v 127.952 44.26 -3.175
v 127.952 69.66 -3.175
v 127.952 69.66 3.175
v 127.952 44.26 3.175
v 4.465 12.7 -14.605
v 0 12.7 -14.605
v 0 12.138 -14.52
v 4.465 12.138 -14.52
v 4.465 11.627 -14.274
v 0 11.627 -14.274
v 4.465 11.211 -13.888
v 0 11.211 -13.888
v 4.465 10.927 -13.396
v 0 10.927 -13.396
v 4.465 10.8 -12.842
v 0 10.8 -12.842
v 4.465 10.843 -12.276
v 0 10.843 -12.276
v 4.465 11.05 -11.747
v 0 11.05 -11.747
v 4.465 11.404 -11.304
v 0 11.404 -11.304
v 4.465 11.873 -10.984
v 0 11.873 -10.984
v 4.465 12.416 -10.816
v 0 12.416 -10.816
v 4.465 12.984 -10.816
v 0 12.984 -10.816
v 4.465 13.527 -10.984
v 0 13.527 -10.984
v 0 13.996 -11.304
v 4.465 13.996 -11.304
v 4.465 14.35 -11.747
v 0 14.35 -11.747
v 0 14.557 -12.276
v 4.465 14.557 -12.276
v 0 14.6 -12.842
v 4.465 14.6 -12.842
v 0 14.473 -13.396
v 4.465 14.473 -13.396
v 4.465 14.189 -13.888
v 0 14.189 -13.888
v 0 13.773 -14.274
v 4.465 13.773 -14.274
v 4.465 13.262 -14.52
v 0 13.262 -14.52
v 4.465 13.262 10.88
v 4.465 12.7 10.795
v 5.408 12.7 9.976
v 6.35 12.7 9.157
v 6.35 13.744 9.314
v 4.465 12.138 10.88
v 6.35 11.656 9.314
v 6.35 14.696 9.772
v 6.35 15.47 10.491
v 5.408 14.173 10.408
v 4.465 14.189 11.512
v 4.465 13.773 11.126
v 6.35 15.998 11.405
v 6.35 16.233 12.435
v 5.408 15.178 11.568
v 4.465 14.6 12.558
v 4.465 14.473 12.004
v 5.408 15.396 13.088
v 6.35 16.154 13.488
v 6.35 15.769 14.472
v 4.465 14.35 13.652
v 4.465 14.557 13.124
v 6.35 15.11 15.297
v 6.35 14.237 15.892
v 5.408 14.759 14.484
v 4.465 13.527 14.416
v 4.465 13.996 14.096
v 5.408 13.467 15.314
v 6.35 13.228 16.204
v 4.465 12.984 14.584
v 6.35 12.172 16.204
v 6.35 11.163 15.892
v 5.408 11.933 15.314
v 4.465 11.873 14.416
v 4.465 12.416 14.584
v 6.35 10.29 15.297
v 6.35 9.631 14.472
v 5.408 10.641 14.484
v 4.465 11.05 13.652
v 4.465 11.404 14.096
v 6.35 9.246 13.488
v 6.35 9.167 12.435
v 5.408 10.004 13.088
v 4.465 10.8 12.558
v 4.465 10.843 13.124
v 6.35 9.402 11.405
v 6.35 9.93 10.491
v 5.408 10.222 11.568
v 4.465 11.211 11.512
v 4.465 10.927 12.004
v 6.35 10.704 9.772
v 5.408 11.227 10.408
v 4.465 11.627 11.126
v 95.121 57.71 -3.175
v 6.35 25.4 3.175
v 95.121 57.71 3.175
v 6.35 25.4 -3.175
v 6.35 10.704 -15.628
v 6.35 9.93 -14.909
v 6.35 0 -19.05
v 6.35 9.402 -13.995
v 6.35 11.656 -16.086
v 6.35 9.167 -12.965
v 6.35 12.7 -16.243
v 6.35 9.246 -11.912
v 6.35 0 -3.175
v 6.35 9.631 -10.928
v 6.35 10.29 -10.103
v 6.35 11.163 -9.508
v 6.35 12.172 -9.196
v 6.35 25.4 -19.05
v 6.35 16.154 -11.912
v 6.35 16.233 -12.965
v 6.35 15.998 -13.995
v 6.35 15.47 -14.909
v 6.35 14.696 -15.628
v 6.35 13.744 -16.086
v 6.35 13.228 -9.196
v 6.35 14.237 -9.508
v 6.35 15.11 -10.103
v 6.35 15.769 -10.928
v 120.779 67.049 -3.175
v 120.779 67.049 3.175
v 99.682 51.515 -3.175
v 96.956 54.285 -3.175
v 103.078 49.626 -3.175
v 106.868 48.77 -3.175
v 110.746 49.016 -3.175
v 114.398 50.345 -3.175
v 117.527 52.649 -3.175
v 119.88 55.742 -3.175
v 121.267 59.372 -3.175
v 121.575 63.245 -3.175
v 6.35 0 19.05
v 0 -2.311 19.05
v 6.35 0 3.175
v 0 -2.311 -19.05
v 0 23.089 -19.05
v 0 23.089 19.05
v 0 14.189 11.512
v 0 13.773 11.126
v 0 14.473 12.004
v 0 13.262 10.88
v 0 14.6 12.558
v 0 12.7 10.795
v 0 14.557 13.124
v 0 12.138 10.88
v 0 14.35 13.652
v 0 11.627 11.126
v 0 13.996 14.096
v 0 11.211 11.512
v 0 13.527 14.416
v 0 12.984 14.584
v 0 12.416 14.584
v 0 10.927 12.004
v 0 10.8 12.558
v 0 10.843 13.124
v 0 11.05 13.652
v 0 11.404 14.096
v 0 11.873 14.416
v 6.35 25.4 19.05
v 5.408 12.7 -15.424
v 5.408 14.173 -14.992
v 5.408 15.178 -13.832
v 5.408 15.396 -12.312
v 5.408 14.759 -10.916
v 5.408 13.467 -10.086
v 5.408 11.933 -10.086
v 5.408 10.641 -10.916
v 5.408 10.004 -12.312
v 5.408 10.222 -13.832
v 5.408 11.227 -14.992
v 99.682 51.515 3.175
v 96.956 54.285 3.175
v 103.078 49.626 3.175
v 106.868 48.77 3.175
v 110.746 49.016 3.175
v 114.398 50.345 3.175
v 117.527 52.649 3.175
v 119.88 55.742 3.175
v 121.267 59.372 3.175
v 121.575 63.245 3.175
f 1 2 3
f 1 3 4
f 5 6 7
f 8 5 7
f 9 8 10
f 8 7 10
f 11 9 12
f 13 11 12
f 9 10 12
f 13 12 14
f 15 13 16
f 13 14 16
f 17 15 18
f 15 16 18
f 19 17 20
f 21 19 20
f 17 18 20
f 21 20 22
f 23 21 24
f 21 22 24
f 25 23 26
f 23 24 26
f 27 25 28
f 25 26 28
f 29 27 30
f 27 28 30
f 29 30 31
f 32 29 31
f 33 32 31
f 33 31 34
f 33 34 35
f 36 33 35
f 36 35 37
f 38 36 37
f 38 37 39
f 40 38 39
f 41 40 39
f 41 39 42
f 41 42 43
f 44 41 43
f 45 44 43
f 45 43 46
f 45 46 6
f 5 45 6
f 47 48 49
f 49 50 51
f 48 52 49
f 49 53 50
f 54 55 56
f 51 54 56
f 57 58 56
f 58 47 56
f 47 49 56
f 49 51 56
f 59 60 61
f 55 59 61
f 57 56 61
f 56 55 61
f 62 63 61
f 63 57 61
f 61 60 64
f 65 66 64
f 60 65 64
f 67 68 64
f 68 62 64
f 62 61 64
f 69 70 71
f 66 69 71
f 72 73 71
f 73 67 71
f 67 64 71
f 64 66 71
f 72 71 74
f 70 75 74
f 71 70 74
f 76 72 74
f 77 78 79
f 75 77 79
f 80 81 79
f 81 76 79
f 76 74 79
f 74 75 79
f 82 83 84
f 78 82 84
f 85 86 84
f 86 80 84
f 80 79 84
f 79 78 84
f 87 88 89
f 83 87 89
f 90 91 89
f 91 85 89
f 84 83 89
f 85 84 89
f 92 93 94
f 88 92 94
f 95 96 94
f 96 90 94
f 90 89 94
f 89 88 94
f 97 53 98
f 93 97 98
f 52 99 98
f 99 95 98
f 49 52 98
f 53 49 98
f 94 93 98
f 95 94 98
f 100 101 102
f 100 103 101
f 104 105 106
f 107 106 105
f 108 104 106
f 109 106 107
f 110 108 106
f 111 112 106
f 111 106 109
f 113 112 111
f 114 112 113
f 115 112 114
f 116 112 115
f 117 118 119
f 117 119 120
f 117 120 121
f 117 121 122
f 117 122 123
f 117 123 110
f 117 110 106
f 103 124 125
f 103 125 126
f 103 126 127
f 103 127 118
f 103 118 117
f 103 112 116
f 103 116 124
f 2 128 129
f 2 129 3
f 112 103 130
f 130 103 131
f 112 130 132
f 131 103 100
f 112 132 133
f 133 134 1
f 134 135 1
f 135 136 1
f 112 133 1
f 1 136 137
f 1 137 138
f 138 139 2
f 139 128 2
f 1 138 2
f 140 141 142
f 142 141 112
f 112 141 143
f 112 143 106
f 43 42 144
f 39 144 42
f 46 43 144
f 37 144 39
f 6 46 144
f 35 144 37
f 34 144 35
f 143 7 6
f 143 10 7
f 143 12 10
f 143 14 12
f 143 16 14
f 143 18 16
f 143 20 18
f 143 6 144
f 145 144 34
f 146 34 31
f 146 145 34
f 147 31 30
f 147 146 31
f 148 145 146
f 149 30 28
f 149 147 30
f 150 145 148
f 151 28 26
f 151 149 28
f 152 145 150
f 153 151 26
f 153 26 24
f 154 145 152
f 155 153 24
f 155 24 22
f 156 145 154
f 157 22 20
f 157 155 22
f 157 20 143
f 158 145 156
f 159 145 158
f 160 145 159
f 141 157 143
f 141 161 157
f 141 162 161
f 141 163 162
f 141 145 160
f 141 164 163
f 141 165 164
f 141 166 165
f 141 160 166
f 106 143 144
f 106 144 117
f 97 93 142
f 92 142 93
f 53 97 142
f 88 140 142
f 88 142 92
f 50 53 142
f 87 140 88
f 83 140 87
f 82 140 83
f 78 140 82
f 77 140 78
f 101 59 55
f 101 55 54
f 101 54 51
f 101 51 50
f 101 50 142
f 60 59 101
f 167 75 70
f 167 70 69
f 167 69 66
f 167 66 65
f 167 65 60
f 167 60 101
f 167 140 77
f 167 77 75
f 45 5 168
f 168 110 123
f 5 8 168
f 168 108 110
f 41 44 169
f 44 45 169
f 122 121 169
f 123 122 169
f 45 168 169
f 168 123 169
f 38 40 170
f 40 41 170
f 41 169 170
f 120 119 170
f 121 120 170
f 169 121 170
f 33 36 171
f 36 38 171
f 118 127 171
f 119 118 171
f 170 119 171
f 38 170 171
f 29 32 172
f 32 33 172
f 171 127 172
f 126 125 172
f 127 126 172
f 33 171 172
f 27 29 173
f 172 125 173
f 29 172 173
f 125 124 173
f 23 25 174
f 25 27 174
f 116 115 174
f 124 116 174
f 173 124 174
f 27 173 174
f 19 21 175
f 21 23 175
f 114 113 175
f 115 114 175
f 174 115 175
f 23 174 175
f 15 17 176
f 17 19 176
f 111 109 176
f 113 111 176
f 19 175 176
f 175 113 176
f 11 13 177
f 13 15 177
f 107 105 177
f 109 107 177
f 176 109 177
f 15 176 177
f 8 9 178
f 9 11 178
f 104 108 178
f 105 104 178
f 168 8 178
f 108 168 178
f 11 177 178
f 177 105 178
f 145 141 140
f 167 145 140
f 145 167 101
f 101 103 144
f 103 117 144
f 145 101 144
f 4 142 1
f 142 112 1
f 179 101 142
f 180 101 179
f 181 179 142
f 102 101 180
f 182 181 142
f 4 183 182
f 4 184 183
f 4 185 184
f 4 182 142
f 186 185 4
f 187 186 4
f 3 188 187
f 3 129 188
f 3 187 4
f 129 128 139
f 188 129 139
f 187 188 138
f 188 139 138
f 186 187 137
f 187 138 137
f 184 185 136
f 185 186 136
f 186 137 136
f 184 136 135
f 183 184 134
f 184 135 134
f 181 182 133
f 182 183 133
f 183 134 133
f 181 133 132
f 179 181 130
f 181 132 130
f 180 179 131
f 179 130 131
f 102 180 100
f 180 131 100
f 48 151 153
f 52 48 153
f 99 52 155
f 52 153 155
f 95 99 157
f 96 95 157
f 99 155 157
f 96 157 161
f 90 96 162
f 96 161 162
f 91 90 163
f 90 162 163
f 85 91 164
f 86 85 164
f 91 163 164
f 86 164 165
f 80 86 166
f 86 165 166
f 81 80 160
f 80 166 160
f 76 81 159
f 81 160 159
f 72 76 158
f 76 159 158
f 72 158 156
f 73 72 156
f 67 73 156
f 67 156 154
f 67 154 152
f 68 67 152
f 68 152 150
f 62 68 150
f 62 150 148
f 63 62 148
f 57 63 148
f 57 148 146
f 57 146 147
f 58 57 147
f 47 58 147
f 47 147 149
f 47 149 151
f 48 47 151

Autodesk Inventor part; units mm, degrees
ref_plane "YZ Plane" through (0, 0, 0) normal (1, 0, 0) x (0, 1, 0)
ref_plane "XZ Plane" through (0, 0, 0) normal (0, 1, 0) x (-1, 0, 0)
ref_plane "XY Plane" through (0, 0, 0) normal (0, 0, 1) x (1, 0, 0)
sketch "Sketch5" plane through (0, 0, 0) normal (0, 0, 1) x (1, 0, 0)
  line L0 (0, 0) -> (6.35, 0)
  line L1 (6.35, 0) -> (6.35, 25.4)
  line L2 (6.35, 25.4) -> (0, 25.4)
  line L3 (0, 25.4) -> (0, 0)
  dimension "d21" = 25.4
  dimension "d22" = 6.35
extrude "Extrusion3" add sketch "Sketch5" against normal mid plane 38.1
sketch "Sketch6" plane through (0, 0, 0) normal (0, 0, 1) x (1, 0, 0)
  line L0 (6.35, 25.4) -> (6.35, 0) projected
  line L1 (0, 25.4) -> (6.35, 25.4) projected
  line L2 (6.35, 0) -> (0, 0) projected
  line L3 (0, 0) -> (0, 25.4) projected
  line L4 (6.35, 0) -> (127.9525, 44.2597)
  line L5 (6.35, 0) -> (135.7567, 0) construction
  line L6 (127.9525, 69.6597) -> (127.9525, 44.2597)
  arc A0 (95.1208, 57.7099) -> (120.7792, 67.0488) centre (107.95, 62.3794) ccw
  line L7 (6.35, 25.4) -> (95.1208, 57.7099)
  line L8 (120.7792, 67.0488) -> (127.9525, 69.6597)
  dimension "d25" = 20
  dimension "d26" = 27.305
  dimension "d29" = 6.35
  dimension "d30" = 107.95
  dimension "d33" = 0
extrude "Extrusion4" add sketch "Sketch6" along normal mid plane 6.35 contours L7 A0 L8 L6 L4 L0
sketch "Sketch7" plane through (6.35, 0, 19.05) normal (1, 0, 0) x (0, 0, -1)
  line L0 (38.1, 25.4) -> (0, 25.4) construction
  line L1 (6.35, 25.4) -> (6.35, 0) construction
  line L2 (31.75, 25.4) -> (31.75, 0) construction
  line L3 (0, 0) -> (0, 25.4) construction
  line L4 (38.1, 25.4) -> (38.1, 0) construction
  line L5 (0, 0) -> (15.875, 0) projected
  line L6 (22.225, 0) -> (38.1, 0) projected
  point P0 (19.05, 0)
  point P1 (6.35, 12.7)
  point P2 (31.75, 12.7)
  dimension "d34" = 6.35
  dimension "d35" = 6.35
sketch "Sketch8" plane through (0, 0, 0) normal (0, 0, 1) x (1, 0, 0)
  line L0 (0, 0) -> (0, 25.4) projected
  line L1 (6.35, 0) -> (0, 0) projected
  line L2 (127.9525, 44.2597) -> (6.35, 0) projected
  line L3 (0, 0) -> (6.35, 0)
  line L4 (0, -2.3112) -> (6.35, 0)
  line L5 (0, 0) -> (0, -2.3112)
extrude "Extrusion5" add sketch "Sketch8" along normal mid plane 38.1
hole "Hole3" at (6.35, 12.7, 12.7) at (6.35, 12.7, -12.7) direction (-1, 0, 0) diameter 3.81 end through all countersink diameter 7.0866 countersink angle 82 clearance for "Flat Head Machine Screw (82)" size "#6" standard "Ansi Unified Screw Threads"
sketch "Sketch9" plane through (0, 0, 0) normal (0, 0, 1) x (1, 0, 0)
  line L0 (6.35, 25.4) -> (6.35, 0) projected
  line L1 (0, 25.4) -> (6.35, 25.4) projected
  line L2 (6.35, 25.4) -> (95.1208, 57.7099) projected
  line L3 (0, -2.3112) -> (0, 25.4) projected
  line L4 (6.35, 25.4) -> (0, 25.4)
  line L5 (6.35, 25.4) -> (6.35, 0) projected
  line L6 (6.35, 25.4) -> (0, 23.0888)
  line L7 (0, 25.4) -> (0, 23.0888)
  point P0 (0, 0)
extrude "Extrusion6" cut sketch "Sketch9" along normal mid plane 38.1
equation "\"d21\" = supportHeight"
equation "\"d22\" = supportWidth"
equation "\"d23\" = totalScrewHoldWidth"
equation "\"d25\" = supportAngle"
equation "\"d26\" = pipeDiameter"
equation "\"d30\" = distanceFromWallToPipeCenter"
equation "\"d31\" = supportWidth"
equation "\"d47\" = totalScrewHoldWidth"
equation "\"d63\" = totalScrewHoldWidth"
equation "\"pipeDiameter\" = 27.305"
equation "\"distanceFromWallToPipeCenter\" = 107.95"
equation "\"supportHeight\" = 25.4"
equation "\"supportWidth\" = 6.35"
equation "\"screwHoldDepth\" = 6.35"
equation "\"totalScrewHoldWidth\" = 38.1"
equation "\"screwPositionFromTop\" = 6.35"
equation "\"supportAngle\" = 20deg"
properties part number "PipeSupport-4_00-020"
